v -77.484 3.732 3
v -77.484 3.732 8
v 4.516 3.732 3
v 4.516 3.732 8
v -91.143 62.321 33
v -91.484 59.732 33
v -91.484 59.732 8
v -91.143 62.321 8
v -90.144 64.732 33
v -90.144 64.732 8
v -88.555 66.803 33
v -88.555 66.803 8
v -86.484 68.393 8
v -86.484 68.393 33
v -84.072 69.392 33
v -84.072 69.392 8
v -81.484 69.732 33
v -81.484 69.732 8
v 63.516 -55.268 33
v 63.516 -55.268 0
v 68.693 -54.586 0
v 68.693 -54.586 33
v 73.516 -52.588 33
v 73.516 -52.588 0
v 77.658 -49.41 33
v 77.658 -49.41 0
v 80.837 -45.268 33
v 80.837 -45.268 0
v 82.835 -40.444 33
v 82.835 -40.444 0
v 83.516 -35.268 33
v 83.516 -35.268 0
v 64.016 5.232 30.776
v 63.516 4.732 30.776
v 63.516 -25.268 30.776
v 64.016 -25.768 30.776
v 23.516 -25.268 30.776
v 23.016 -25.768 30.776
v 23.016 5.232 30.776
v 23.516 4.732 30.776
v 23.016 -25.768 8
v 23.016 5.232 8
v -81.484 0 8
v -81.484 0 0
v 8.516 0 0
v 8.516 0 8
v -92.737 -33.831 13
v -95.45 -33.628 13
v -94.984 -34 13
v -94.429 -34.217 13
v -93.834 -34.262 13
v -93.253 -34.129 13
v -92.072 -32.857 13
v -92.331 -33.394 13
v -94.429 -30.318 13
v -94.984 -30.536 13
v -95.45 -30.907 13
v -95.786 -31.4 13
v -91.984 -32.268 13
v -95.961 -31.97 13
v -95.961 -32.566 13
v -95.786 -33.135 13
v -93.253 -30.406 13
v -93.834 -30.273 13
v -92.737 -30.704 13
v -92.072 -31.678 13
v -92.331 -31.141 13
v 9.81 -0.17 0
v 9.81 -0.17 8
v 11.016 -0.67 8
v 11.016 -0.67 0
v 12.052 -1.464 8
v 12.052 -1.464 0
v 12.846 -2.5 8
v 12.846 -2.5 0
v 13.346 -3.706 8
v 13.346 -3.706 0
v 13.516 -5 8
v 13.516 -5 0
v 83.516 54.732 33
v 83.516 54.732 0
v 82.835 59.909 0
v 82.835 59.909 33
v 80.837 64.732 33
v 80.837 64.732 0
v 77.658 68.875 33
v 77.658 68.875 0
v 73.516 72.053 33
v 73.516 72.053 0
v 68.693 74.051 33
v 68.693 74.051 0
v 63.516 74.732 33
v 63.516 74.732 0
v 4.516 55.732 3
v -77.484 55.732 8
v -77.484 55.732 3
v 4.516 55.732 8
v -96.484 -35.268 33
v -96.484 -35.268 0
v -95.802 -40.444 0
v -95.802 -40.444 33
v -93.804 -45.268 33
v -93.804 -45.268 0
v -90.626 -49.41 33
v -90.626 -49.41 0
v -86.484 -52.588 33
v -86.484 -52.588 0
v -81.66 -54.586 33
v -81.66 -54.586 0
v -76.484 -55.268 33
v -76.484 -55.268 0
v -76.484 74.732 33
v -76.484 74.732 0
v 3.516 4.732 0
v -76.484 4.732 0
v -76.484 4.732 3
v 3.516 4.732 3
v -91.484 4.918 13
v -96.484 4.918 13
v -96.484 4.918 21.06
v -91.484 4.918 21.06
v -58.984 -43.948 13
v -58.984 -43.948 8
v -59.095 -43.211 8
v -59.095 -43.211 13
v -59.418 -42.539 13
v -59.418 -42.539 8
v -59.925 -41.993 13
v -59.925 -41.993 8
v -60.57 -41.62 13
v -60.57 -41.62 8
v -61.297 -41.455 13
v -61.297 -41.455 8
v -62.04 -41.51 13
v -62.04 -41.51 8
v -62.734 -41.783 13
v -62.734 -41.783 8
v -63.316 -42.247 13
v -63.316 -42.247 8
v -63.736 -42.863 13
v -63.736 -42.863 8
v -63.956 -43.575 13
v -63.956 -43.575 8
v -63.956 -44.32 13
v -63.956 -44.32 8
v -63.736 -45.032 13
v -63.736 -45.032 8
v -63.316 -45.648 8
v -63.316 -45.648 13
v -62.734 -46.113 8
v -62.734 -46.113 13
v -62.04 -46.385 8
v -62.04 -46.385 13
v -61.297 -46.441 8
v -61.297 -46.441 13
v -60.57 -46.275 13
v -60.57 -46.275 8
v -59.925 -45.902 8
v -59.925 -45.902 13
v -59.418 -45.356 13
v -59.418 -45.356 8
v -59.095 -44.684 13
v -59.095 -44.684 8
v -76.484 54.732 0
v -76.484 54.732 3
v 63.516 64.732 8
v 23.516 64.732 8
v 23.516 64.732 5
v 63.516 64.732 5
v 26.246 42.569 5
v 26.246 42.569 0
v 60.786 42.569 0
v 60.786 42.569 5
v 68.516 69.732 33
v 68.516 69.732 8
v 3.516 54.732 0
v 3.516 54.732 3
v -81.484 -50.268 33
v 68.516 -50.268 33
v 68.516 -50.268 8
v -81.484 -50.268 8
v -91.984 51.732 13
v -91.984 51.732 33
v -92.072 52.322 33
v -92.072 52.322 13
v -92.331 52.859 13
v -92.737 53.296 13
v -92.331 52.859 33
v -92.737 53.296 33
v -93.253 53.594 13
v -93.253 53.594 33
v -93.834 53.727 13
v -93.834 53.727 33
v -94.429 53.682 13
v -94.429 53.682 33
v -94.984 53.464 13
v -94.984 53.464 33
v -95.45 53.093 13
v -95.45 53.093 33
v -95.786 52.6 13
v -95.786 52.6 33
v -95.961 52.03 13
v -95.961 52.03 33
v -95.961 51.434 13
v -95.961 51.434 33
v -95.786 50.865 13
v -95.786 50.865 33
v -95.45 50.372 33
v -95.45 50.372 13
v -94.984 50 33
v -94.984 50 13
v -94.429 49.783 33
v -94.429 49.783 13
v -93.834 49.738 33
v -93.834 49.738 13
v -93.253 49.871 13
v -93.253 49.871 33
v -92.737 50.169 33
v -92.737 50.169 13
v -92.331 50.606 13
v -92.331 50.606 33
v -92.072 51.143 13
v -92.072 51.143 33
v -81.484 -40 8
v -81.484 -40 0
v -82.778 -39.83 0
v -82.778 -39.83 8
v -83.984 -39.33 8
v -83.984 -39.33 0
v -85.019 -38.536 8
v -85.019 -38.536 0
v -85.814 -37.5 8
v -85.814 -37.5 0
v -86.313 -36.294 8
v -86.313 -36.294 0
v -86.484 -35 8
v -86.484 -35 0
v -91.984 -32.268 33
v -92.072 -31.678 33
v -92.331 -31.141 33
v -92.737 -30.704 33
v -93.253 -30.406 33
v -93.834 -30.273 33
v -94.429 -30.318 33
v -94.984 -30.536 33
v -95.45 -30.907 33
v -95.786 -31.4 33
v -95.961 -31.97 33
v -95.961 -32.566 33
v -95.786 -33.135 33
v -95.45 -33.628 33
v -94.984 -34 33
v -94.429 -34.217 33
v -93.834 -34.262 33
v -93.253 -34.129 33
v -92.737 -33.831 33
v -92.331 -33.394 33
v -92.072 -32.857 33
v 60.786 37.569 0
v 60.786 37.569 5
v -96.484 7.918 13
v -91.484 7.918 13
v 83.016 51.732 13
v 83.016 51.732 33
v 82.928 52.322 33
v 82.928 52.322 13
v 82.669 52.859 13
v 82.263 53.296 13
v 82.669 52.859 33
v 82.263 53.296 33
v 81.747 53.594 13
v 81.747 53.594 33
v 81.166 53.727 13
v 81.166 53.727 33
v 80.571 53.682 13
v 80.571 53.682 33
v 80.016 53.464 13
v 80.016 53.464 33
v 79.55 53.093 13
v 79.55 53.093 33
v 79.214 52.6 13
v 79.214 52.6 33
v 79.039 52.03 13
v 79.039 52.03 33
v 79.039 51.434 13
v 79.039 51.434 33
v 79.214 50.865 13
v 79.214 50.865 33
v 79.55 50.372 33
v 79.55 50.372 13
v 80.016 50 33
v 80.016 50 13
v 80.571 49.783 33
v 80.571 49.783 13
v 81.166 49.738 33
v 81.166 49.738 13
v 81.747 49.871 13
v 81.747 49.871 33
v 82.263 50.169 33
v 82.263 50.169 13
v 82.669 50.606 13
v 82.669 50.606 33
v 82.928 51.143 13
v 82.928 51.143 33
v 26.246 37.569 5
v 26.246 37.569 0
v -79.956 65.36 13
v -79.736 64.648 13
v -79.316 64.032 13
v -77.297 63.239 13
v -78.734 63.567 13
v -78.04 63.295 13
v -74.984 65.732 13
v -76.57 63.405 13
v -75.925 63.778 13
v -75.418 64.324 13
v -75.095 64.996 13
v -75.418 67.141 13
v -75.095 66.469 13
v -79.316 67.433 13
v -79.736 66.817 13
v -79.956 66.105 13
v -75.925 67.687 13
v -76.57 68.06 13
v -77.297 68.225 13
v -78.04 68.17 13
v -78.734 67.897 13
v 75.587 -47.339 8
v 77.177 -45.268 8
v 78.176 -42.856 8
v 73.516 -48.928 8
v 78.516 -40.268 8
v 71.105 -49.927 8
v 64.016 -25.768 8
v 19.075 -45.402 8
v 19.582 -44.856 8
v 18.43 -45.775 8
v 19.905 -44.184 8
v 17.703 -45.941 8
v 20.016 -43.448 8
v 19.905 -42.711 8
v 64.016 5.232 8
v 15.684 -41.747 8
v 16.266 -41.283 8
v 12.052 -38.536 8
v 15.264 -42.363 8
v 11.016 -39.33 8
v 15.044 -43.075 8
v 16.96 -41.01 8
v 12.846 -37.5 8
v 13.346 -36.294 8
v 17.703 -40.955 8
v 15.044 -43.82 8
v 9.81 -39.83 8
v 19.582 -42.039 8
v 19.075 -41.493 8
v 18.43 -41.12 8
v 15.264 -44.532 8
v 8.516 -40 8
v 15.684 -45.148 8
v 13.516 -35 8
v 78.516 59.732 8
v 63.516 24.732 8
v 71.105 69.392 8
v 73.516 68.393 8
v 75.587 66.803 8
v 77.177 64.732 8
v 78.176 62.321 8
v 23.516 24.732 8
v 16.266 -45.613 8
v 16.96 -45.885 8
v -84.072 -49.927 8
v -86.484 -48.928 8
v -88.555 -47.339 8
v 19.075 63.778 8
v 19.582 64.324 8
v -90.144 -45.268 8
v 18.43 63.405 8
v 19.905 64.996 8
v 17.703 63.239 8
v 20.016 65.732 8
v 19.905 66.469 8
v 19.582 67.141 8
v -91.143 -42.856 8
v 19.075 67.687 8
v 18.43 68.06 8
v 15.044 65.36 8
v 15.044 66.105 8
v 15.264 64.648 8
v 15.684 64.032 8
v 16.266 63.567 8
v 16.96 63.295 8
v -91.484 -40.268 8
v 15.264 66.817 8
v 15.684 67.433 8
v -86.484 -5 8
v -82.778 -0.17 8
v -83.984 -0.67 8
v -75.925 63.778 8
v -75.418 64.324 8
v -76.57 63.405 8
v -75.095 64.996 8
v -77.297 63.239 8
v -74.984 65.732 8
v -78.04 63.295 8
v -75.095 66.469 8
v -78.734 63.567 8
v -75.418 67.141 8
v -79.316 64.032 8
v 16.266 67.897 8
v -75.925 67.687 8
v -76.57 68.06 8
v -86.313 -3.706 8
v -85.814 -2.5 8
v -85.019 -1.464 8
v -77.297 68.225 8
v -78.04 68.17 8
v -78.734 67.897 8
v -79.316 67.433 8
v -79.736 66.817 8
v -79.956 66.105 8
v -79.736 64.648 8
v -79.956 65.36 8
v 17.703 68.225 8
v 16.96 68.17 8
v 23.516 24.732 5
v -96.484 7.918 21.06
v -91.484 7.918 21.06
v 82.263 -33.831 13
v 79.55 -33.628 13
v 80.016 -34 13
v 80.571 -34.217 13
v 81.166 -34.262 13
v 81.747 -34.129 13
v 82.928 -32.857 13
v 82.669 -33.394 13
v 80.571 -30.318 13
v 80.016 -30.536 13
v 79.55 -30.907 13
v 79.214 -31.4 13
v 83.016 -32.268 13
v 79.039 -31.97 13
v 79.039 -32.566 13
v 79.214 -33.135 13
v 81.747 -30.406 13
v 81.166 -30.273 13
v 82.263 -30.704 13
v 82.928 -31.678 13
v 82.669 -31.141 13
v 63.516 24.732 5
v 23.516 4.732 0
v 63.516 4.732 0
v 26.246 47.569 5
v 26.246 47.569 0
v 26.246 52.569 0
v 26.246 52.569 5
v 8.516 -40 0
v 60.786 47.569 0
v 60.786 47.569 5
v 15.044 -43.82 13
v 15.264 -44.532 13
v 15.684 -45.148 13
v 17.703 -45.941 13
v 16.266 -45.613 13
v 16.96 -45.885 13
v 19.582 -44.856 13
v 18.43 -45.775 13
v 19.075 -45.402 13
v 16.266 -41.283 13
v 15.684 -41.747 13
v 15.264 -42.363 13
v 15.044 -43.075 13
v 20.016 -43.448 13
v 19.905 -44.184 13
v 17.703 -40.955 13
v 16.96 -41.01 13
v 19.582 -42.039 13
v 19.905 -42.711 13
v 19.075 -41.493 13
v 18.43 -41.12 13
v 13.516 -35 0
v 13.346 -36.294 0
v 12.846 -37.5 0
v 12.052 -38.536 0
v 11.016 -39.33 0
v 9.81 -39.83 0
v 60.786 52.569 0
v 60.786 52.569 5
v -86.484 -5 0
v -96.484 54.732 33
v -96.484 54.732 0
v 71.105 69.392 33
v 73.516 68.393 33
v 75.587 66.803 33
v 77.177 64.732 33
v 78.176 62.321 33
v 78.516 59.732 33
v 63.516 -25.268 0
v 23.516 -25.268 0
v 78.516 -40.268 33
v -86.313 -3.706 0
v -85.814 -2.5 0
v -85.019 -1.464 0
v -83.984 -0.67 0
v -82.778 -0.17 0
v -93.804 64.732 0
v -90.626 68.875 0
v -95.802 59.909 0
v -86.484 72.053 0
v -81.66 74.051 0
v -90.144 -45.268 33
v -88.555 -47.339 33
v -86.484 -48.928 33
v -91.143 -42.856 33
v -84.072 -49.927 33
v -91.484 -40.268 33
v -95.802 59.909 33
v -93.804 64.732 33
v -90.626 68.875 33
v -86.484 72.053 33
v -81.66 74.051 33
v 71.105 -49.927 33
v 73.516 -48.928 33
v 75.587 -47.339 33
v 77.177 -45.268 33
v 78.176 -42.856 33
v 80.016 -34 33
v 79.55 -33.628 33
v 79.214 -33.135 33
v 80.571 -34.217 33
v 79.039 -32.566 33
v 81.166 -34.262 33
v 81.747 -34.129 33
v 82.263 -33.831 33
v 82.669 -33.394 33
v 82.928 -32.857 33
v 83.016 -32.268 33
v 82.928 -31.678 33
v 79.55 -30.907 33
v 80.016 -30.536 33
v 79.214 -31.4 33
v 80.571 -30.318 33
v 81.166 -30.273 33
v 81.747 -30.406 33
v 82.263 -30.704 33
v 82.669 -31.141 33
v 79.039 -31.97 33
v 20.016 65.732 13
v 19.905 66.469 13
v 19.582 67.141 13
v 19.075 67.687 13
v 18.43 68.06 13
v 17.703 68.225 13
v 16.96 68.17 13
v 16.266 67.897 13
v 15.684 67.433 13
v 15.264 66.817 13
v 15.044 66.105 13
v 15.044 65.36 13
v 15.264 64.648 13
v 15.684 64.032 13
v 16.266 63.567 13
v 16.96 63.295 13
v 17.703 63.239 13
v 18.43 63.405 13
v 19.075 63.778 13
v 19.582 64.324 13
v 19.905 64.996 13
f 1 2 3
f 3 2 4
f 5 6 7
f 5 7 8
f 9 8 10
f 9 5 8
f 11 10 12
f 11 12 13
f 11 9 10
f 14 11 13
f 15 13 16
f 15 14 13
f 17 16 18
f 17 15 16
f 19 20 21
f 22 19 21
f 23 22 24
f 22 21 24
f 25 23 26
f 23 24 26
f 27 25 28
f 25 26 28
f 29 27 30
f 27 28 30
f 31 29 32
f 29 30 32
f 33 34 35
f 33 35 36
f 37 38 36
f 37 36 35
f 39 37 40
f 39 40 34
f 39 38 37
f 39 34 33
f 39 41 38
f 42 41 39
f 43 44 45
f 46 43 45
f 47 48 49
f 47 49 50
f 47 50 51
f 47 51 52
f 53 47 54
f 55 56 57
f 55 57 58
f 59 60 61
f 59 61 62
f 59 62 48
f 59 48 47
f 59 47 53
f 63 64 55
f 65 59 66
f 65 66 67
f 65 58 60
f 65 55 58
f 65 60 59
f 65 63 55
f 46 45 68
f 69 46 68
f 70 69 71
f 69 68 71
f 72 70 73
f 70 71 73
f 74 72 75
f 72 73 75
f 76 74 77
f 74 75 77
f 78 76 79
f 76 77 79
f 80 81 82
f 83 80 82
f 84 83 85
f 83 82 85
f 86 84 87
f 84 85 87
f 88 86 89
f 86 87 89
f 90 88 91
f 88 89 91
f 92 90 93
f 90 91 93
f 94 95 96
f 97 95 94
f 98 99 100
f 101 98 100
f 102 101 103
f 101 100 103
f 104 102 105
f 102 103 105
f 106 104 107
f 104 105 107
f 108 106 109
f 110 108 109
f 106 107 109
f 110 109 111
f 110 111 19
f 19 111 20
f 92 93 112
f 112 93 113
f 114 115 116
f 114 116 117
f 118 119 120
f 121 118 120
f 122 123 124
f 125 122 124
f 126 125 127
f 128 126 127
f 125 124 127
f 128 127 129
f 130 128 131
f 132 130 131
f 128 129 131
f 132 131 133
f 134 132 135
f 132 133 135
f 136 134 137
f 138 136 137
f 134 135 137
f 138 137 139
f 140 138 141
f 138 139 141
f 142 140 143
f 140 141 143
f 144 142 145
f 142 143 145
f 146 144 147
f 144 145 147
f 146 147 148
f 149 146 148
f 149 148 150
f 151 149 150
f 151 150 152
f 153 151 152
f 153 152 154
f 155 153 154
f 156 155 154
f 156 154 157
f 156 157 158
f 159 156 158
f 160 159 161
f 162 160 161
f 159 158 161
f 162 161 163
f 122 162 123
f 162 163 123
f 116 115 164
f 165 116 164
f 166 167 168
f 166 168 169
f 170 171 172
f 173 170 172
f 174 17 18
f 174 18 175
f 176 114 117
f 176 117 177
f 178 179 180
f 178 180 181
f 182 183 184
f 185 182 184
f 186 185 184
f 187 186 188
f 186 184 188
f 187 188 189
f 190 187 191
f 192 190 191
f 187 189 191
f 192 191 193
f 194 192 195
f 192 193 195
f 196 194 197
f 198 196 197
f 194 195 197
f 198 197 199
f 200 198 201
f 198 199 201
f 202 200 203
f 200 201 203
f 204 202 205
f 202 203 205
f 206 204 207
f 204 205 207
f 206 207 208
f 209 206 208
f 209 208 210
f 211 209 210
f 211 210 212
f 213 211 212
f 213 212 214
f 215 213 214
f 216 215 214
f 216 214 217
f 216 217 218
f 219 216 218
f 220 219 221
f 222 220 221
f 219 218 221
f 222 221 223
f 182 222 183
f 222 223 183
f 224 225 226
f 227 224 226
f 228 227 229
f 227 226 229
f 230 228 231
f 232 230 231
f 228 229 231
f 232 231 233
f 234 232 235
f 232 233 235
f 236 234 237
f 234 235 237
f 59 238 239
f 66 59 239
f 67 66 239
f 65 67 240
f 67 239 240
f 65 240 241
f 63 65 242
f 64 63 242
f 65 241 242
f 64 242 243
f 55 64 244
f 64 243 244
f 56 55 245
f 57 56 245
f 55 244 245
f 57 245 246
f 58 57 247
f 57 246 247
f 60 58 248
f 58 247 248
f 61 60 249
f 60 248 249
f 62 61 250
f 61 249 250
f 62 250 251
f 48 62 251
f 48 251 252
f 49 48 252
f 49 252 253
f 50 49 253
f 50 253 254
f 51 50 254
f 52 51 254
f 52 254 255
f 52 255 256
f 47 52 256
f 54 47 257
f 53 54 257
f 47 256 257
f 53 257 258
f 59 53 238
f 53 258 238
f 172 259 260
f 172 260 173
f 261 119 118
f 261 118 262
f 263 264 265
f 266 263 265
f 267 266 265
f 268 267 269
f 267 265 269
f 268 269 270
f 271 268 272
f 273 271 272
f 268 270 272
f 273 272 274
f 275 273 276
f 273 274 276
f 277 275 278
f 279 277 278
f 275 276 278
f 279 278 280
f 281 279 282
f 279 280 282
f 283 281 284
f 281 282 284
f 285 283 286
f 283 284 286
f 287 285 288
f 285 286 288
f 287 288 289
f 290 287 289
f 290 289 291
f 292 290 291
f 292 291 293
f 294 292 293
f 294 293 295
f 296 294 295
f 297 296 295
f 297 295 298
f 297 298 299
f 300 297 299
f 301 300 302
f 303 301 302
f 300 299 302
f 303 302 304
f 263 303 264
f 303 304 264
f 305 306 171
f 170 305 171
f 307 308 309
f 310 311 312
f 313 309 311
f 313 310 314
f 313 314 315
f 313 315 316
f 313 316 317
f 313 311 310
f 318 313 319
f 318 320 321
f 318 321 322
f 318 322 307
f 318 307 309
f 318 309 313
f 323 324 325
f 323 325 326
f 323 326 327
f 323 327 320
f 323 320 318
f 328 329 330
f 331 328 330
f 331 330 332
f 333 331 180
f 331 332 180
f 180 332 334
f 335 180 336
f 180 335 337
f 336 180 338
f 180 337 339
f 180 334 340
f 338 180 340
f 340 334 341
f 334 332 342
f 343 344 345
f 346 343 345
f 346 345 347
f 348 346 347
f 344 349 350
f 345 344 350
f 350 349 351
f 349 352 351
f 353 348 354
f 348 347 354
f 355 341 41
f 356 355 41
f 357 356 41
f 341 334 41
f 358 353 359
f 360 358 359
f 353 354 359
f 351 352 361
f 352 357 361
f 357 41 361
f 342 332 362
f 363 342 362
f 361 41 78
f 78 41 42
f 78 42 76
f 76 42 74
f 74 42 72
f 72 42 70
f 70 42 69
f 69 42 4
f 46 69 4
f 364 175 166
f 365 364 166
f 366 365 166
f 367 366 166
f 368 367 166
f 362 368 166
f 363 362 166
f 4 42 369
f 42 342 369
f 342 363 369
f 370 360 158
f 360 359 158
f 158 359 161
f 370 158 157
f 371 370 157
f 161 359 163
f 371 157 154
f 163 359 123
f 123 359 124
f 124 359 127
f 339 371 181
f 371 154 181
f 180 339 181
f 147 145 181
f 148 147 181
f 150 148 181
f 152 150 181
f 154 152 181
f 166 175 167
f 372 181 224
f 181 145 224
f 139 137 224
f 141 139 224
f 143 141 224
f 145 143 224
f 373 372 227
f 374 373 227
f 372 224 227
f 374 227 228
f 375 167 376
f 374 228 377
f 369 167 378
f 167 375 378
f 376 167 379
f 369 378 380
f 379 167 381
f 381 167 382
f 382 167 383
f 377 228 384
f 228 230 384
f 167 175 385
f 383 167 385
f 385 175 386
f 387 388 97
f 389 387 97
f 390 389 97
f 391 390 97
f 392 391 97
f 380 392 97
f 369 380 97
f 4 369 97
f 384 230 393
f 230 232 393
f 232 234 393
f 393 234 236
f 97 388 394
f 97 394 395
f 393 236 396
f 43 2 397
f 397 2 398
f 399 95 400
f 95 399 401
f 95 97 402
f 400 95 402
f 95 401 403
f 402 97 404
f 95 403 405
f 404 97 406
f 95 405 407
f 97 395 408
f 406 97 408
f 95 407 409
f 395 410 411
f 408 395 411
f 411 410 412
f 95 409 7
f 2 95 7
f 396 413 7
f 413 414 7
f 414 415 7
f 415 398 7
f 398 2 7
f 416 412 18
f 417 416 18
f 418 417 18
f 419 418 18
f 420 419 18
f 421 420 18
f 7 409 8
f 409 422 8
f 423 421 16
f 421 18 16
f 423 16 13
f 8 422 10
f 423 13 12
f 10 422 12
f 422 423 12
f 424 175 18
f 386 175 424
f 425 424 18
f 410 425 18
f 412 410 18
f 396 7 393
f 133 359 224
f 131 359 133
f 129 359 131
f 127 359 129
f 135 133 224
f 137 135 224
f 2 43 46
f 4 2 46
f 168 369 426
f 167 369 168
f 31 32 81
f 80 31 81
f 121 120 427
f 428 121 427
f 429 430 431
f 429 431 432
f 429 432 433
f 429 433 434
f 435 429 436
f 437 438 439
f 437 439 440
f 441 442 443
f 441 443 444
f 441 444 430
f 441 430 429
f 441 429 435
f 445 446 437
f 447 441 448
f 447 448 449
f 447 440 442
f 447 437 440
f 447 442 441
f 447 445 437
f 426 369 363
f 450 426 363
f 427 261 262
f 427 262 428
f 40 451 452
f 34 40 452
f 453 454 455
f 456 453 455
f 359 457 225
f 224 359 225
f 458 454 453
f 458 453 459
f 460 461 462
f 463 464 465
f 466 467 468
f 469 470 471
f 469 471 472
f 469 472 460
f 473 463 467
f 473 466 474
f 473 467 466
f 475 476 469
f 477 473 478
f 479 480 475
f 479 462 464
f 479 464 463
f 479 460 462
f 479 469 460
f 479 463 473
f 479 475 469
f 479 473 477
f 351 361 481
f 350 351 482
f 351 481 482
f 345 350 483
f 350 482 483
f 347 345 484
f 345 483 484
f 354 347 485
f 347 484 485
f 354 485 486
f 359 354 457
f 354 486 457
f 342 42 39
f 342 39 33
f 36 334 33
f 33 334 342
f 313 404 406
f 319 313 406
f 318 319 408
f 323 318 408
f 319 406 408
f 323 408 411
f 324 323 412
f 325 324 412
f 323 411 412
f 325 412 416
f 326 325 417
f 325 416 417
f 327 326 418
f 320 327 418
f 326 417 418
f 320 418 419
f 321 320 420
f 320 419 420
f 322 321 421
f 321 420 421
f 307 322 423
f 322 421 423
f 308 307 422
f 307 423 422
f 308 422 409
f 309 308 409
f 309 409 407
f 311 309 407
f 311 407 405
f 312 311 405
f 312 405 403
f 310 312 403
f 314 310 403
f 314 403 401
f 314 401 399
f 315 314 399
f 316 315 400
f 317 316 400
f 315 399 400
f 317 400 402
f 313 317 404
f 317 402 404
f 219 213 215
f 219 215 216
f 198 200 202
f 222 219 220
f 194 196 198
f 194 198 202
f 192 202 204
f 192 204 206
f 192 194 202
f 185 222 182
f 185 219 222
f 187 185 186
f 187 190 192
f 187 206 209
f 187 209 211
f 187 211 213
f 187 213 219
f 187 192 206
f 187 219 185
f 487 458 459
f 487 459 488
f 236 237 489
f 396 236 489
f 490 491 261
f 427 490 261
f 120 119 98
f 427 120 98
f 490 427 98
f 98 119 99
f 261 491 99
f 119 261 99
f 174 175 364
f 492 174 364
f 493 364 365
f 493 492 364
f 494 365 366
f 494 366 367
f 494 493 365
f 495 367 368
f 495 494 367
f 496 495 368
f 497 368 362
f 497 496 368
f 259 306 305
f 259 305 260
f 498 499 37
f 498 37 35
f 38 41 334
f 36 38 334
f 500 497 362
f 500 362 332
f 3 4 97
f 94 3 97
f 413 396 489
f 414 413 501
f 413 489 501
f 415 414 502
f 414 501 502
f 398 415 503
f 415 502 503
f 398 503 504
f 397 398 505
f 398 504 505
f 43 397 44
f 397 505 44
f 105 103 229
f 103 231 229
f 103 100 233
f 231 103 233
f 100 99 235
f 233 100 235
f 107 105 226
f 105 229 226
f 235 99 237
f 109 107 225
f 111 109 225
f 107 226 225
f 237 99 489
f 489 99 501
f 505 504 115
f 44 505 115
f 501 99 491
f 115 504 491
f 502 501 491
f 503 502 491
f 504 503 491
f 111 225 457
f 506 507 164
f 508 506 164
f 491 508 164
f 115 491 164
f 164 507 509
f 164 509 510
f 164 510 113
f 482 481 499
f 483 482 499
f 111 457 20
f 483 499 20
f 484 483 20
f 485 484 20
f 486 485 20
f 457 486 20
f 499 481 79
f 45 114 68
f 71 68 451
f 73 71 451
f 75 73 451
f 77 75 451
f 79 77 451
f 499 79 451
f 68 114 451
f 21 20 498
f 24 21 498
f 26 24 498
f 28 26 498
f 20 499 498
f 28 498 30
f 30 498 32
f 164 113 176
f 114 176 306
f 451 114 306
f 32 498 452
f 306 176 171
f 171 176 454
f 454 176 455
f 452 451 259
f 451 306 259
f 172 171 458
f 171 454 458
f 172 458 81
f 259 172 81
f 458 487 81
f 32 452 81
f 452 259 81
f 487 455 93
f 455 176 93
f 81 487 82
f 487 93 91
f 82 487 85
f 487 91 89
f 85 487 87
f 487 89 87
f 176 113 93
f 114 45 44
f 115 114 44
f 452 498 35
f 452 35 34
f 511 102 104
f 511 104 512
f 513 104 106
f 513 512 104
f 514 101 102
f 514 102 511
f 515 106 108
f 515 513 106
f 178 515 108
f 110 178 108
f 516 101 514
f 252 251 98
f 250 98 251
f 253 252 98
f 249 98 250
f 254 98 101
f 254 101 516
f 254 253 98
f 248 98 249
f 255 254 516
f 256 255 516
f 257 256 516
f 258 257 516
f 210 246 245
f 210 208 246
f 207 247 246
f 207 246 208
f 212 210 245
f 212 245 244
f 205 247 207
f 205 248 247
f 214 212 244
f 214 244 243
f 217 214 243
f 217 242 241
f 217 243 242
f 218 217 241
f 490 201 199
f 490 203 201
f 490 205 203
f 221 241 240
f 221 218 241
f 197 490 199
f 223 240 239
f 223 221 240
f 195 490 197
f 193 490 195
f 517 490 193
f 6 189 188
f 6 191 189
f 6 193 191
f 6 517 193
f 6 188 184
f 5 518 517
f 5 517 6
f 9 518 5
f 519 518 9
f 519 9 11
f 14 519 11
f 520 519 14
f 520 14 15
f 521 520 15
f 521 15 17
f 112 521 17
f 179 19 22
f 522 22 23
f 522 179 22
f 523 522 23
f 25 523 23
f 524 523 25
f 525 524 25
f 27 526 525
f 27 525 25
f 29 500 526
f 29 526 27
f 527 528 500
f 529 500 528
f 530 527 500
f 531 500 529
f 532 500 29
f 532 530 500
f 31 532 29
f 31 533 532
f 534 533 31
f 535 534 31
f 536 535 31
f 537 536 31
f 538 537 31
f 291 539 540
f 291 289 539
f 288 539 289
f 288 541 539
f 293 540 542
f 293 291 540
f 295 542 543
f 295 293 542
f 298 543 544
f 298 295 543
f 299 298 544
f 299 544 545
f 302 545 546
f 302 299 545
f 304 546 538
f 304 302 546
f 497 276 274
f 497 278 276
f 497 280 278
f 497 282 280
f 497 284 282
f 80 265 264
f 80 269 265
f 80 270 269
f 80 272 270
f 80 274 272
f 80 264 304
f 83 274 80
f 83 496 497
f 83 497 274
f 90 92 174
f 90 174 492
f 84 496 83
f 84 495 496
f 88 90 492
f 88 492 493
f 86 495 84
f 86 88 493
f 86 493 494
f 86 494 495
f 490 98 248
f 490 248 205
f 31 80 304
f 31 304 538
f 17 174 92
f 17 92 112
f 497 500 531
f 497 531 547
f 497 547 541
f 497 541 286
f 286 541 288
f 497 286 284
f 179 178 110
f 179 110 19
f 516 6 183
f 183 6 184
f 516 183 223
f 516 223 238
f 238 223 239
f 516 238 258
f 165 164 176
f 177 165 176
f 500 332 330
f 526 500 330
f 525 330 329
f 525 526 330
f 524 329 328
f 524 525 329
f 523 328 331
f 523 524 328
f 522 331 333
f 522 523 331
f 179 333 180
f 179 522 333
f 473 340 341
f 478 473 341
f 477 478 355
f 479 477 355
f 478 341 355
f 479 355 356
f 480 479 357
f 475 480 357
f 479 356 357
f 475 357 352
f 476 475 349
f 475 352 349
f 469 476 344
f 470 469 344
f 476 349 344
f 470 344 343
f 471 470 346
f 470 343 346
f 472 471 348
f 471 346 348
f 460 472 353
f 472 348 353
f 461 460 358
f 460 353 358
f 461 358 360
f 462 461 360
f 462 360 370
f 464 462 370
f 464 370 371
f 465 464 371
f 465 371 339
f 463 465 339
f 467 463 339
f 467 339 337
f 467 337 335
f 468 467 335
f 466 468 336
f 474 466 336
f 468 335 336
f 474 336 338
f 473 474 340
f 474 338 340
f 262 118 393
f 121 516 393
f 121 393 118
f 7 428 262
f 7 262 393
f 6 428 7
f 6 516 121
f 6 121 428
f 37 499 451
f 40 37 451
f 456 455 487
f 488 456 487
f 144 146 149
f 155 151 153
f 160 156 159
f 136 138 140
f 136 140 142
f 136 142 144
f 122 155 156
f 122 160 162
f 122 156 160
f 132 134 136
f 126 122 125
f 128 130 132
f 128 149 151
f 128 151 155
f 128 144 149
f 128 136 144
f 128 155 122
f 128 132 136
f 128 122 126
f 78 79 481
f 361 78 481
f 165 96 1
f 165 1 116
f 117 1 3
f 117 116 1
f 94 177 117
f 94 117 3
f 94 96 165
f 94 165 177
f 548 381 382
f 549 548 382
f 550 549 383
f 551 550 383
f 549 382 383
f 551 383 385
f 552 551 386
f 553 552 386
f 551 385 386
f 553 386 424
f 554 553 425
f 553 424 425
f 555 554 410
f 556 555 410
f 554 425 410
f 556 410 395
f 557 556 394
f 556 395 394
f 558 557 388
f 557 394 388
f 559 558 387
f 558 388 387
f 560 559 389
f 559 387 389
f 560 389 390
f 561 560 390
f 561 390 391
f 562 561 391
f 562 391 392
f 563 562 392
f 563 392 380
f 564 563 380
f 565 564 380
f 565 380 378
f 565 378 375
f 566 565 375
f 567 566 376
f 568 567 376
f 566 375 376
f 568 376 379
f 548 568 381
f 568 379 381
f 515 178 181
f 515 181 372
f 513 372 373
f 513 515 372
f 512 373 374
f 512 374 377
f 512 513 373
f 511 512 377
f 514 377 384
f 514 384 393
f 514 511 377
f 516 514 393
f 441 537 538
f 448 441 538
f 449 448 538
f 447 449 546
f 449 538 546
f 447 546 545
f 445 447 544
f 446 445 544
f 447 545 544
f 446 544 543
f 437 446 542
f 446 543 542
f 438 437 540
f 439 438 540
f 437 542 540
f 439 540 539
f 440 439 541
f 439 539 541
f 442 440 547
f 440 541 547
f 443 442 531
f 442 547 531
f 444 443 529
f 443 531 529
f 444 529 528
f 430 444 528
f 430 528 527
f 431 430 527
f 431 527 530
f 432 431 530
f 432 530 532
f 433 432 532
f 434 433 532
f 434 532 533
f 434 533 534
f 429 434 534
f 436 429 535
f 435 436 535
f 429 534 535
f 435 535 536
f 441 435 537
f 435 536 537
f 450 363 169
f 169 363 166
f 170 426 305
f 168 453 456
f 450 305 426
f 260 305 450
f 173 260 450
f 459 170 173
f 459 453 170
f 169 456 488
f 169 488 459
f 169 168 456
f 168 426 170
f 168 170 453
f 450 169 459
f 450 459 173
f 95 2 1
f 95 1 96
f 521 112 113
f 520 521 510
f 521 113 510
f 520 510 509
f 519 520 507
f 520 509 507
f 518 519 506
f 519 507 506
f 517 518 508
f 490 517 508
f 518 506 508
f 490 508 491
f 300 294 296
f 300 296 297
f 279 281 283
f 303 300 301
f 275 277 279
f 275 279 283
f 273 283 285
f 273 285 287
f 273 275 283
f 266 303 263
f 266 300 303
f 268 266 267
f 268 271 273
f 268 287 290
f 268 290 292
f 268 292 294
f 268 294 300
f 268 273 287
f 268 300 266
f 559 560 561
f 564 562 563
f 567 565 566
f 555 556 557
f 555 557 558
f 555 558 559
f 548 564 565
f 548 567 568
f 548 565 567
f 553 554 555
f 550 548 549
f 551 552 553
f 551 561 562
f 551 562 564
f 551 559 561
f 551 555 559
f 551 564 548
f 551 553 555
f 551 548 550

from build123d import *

# Parameters (mm, degrees)
SKETCH2_W           = 40
SKETCH2_H           = 30
SKETCH2_W_2         = 80
SKETCH2_H_2         = 50
SKETCH2_W_3         = 34.54
SKETCH2_H_3         = 5
BOSS_EXTRUDE5_DEPTH = 33
CUT_EXTRUDE1_DEPTH  = 25
SKETCH5_W           = 40
SKETCH5_H           = 40
CUT_EXTRUDE2_DEPTH  = 3
SKETCH6_W           = 41
SKETCH6_H           = 31
SKETCH6_W_2         = 40
SKETCH6_H_2         = 30
BOSS_EXTRUDE6_DEPTH = 30
SKETCH7_W           = 82
SKETCH7_H           = 52
SKETCH7_W_2         = 80
SKETCH7_H_2         = 50
CUT_EXTRUDE3_DEPTH  = 5
SKETCH8_R           = 2.5
BOSS_EXTRUDE7_DEPTH = 5
SKETCH10_W          = 7.223837829
SKETCH10_H          = 31
CUT_EXTRUDE6_DEPTH  = 41
SKETCH14_R          = 2
CUT_EXTRUDE9_DEPTH  = 20
SKETCH9_W           = 8.06
SKETCH9_H           = 3
CUT_EXTRUDE11_DEPTH = 5


with BuildPart() as part:
    # Sketch2 → Boss-Extrude5 (new body)
    with BuildSketch(Plane.XY):
        with BuildLine():
            ThreePointArc((-76.48364315, 74.732394366), (-90.625778773, 68.87452999), (-96.48364315, 54.732394366))
            Line((-96.48364315, 54.732394366), (-96.48364315, -35.267605634))
            ThreePointArc((-96.48364315, -35.267605634), (-90.625778773, -49.409741258), (-76.48364315, -55.267605634))
            Line((-76.48364315, -55.267605634), (63.51635685, -55.267605634))
            ThreePointArc((63.51635685, -55.267605634), (77.658492474, -49.409741258), (83.51635685, -35.267605634))
            Line((83.51635685, -35.267605634), (83.51635685, 54.732394366))
            ThreePointArc((83.51635685, 54.732394366), (77.658492474, 68.87452999), (63.51635685, 74.732394366))
            Line((63.51635685, 74.732394366), (-76.48364315, 74.732394366))
        make_face()
        with Locations((43.51635685, -10.267605634)):
            Rectangle(SKETCH2_W, SKETCH2_H, mode=Mode.SUBTRACT)
        with BuildLine():
            ThreePointArc((-86.48364315, -5), (-85.019177056, -1.464466094), (-81.48364315, 0))
            Line((-81.48364315, 0), (8.51635685, 0))
            ThreePointArc((8.51635685, 0), (12.051890756, -1.464466094), (13.51635685, -5))
            Line((13.51635685, -5), (13.51635685, -35))
            ThreePointArc((13.51635685, -35), (12.051890756, -38.535533906), (8.51635685, -40))
            Line((8.51635685, -40), (-81.48364315, -40))
            ThreePointArc((-81.48364315, -40), (-85.019177056, -38.535533906), (-86.48364315, -35))
            Line((-86.48364315, -35), (-86.48364315, -5))
        make_face(mode=Mode.SUBTRACT)
        with Locations((-36.48364315, 29.732394366)):
            Rectangle(SKETCH2_W_2, SKETCH2_H_2, mode=Mode.SUBTRACT)
        with Locations((43.51635685, 50.069459439)):
            Rectangle(SKETCH2_W_3, SKETCH2_H_3, mode=Mode.SUBTRACT)
        with Locations((43.51635685, 40.069459439)):
            Rectangle(SKETCH2_W_3, SKETCH2_H_3, mode=Mode.SUBTRACT)
    extrude(amount=BOSS_EXTRUDE5_DEPTH)

    # Sketch4 → Cut-Extrude1 (cut)
    with BuildSketch(Plane.XY.offset(33)):
        with BuildLine():
            Line((-81.48364315, 69.732394366), (68.51635685, 69.732394366))
            ThreePointArc((68.51635685, 69.732394366), (75.587424662, 66.803462178), (78.51635685, 59.732394366))
            Line((78.51635685, 59.732394366), (78.51635685, -40.267605634))
            ThreePointArc((78.51635685, -40.267605634), (75.587424662, -47.338673446), (68.51635685, -50.267605634))
            Line((68.51635685, -50.267605634), (-81.48364315, -50.267605634))
            ThreePointArc((-81.48364315, -50.267605634), (-88.554710961, -47.338673446), (-91.48364315, -40.267605634))
            Line((-91.48364315, -40.267605634), (-91.48364315, 59.732394366))
            ThreePointArc((-91.48364315, 59.732394366), (-88.554710961, 66.803462178), (-81.48364315, 69.732394366))
        make_face()
    extrude(amount=-CUT_EXTRUDE1_DEPTH, mode=Mode.SUBTRACT)

    # Sketch5 → Cut-Extrude2 (cut)
    with BuildSketch(Plane.XY.offset(8)):
        with Locations((43.51635685, 44.732394366)):
            Rectangle(SKETCH5_W, SKETCH5_H)
    extrude(amount=-CUT_EXTRUDE2_DEPTH, mode=Mode.SUBTRACT)

    # Sketch6 → Boss-Extrude6 (add)
    with BuildSketch(Plane.XY.offset(8)):
        with Locations((43.51635685, -10.267605634)):
            Rectangle(SKETCH6_W, SKETCH6_H)
        with Locations((43.51635685, -10.267605634)):
            Rectangle(SKETCH6_W_2, SKETCH6_H_2, mode=Mode.SUBTRACT)
    extrude(amount=BOSS_EXTRUDE6_DEPTH)

    # Sketch7 → Cut-Extrude3 (cut)
    with BuildSketch(Plane.XY.offset(8)):
        with Locations((-36.48364315, 29.732394366)):
            Rectangle(SKETCH7_W, SKETCH7_H)
        with Locations((-36.48364315, 29.732394366)):
            Rectangle(SKETCH7_W_2, SKETCH7_H_2, mode=Mode.SUBTRACT)
    extrude(amount=-CUT_EXTRUDE3_DEPTH, mode=Mode.SUBTRACT)

    # Sketch8 → Boss-Extrude7 (add)
    with BuildSketch(Plane.XY.offset(8)):
        with Locations((-77.48364315, 65.732394366)):
            Circle(SKETCH8_R)
        with Locations((17.51635685, 65.732394366)):
            Circle(SKETCH8_R)
        with Locations((-61.48364315, -43.947605634)):
            Circle(SKETCH8_R)
        with Locations((17.51635685, -43.447605634)):
            Circle(SKETCH8_R)
    extrude(amount=BOSS_EXTRUDE7_DEPTH)

    # Sketch10 → Cut-Extrude6 (cut)
    with BuildSketch(Plane.ZY.offset(-23.01635685)):
        with Locations((34.388081086, -10.267605634)):
            Rectangle(SKETCH10_W, SKETCH10_H)
    extrude(amount=-CUT_EXTRUDE6_DEPTH, mode=Mode.SUBTRACT)

    # Sketch14 → Cut-Extrude9 (cut)
    with BuildSketch(Plane.XY.offset(33)):
        with Locations((-93.98364315, 51.732394366)):
            Circle(SKETCH14_R)
        with Locations((81.01635685, 51.732394366)):
            Circle(SKETCH14_R)
        with Locations((81.01635685, -32.267605634)):
            Circle(SKETCH14_R)
        with Locations((-93.98364315, -32.267605634)):
            Circle(SKETCH14_R)
    extrude(amount=-CUT_EXTRUDE9_DEPTH, mode=Mode.SUBTRACT)

    # Sketch9 → Cut-Extrude11 (cut)
    with BuildSketch(Plane.ZY.offset(96.48364315)):
        with Locations((17.03, 6.418155037)):
            Rectangle(SKETCH9_W, SKETCH9_H)
    extrude(amount=-CUT_EXTRUDE11_DEPTH, mode=Mode.SUBTRACT)


solid = part.part
